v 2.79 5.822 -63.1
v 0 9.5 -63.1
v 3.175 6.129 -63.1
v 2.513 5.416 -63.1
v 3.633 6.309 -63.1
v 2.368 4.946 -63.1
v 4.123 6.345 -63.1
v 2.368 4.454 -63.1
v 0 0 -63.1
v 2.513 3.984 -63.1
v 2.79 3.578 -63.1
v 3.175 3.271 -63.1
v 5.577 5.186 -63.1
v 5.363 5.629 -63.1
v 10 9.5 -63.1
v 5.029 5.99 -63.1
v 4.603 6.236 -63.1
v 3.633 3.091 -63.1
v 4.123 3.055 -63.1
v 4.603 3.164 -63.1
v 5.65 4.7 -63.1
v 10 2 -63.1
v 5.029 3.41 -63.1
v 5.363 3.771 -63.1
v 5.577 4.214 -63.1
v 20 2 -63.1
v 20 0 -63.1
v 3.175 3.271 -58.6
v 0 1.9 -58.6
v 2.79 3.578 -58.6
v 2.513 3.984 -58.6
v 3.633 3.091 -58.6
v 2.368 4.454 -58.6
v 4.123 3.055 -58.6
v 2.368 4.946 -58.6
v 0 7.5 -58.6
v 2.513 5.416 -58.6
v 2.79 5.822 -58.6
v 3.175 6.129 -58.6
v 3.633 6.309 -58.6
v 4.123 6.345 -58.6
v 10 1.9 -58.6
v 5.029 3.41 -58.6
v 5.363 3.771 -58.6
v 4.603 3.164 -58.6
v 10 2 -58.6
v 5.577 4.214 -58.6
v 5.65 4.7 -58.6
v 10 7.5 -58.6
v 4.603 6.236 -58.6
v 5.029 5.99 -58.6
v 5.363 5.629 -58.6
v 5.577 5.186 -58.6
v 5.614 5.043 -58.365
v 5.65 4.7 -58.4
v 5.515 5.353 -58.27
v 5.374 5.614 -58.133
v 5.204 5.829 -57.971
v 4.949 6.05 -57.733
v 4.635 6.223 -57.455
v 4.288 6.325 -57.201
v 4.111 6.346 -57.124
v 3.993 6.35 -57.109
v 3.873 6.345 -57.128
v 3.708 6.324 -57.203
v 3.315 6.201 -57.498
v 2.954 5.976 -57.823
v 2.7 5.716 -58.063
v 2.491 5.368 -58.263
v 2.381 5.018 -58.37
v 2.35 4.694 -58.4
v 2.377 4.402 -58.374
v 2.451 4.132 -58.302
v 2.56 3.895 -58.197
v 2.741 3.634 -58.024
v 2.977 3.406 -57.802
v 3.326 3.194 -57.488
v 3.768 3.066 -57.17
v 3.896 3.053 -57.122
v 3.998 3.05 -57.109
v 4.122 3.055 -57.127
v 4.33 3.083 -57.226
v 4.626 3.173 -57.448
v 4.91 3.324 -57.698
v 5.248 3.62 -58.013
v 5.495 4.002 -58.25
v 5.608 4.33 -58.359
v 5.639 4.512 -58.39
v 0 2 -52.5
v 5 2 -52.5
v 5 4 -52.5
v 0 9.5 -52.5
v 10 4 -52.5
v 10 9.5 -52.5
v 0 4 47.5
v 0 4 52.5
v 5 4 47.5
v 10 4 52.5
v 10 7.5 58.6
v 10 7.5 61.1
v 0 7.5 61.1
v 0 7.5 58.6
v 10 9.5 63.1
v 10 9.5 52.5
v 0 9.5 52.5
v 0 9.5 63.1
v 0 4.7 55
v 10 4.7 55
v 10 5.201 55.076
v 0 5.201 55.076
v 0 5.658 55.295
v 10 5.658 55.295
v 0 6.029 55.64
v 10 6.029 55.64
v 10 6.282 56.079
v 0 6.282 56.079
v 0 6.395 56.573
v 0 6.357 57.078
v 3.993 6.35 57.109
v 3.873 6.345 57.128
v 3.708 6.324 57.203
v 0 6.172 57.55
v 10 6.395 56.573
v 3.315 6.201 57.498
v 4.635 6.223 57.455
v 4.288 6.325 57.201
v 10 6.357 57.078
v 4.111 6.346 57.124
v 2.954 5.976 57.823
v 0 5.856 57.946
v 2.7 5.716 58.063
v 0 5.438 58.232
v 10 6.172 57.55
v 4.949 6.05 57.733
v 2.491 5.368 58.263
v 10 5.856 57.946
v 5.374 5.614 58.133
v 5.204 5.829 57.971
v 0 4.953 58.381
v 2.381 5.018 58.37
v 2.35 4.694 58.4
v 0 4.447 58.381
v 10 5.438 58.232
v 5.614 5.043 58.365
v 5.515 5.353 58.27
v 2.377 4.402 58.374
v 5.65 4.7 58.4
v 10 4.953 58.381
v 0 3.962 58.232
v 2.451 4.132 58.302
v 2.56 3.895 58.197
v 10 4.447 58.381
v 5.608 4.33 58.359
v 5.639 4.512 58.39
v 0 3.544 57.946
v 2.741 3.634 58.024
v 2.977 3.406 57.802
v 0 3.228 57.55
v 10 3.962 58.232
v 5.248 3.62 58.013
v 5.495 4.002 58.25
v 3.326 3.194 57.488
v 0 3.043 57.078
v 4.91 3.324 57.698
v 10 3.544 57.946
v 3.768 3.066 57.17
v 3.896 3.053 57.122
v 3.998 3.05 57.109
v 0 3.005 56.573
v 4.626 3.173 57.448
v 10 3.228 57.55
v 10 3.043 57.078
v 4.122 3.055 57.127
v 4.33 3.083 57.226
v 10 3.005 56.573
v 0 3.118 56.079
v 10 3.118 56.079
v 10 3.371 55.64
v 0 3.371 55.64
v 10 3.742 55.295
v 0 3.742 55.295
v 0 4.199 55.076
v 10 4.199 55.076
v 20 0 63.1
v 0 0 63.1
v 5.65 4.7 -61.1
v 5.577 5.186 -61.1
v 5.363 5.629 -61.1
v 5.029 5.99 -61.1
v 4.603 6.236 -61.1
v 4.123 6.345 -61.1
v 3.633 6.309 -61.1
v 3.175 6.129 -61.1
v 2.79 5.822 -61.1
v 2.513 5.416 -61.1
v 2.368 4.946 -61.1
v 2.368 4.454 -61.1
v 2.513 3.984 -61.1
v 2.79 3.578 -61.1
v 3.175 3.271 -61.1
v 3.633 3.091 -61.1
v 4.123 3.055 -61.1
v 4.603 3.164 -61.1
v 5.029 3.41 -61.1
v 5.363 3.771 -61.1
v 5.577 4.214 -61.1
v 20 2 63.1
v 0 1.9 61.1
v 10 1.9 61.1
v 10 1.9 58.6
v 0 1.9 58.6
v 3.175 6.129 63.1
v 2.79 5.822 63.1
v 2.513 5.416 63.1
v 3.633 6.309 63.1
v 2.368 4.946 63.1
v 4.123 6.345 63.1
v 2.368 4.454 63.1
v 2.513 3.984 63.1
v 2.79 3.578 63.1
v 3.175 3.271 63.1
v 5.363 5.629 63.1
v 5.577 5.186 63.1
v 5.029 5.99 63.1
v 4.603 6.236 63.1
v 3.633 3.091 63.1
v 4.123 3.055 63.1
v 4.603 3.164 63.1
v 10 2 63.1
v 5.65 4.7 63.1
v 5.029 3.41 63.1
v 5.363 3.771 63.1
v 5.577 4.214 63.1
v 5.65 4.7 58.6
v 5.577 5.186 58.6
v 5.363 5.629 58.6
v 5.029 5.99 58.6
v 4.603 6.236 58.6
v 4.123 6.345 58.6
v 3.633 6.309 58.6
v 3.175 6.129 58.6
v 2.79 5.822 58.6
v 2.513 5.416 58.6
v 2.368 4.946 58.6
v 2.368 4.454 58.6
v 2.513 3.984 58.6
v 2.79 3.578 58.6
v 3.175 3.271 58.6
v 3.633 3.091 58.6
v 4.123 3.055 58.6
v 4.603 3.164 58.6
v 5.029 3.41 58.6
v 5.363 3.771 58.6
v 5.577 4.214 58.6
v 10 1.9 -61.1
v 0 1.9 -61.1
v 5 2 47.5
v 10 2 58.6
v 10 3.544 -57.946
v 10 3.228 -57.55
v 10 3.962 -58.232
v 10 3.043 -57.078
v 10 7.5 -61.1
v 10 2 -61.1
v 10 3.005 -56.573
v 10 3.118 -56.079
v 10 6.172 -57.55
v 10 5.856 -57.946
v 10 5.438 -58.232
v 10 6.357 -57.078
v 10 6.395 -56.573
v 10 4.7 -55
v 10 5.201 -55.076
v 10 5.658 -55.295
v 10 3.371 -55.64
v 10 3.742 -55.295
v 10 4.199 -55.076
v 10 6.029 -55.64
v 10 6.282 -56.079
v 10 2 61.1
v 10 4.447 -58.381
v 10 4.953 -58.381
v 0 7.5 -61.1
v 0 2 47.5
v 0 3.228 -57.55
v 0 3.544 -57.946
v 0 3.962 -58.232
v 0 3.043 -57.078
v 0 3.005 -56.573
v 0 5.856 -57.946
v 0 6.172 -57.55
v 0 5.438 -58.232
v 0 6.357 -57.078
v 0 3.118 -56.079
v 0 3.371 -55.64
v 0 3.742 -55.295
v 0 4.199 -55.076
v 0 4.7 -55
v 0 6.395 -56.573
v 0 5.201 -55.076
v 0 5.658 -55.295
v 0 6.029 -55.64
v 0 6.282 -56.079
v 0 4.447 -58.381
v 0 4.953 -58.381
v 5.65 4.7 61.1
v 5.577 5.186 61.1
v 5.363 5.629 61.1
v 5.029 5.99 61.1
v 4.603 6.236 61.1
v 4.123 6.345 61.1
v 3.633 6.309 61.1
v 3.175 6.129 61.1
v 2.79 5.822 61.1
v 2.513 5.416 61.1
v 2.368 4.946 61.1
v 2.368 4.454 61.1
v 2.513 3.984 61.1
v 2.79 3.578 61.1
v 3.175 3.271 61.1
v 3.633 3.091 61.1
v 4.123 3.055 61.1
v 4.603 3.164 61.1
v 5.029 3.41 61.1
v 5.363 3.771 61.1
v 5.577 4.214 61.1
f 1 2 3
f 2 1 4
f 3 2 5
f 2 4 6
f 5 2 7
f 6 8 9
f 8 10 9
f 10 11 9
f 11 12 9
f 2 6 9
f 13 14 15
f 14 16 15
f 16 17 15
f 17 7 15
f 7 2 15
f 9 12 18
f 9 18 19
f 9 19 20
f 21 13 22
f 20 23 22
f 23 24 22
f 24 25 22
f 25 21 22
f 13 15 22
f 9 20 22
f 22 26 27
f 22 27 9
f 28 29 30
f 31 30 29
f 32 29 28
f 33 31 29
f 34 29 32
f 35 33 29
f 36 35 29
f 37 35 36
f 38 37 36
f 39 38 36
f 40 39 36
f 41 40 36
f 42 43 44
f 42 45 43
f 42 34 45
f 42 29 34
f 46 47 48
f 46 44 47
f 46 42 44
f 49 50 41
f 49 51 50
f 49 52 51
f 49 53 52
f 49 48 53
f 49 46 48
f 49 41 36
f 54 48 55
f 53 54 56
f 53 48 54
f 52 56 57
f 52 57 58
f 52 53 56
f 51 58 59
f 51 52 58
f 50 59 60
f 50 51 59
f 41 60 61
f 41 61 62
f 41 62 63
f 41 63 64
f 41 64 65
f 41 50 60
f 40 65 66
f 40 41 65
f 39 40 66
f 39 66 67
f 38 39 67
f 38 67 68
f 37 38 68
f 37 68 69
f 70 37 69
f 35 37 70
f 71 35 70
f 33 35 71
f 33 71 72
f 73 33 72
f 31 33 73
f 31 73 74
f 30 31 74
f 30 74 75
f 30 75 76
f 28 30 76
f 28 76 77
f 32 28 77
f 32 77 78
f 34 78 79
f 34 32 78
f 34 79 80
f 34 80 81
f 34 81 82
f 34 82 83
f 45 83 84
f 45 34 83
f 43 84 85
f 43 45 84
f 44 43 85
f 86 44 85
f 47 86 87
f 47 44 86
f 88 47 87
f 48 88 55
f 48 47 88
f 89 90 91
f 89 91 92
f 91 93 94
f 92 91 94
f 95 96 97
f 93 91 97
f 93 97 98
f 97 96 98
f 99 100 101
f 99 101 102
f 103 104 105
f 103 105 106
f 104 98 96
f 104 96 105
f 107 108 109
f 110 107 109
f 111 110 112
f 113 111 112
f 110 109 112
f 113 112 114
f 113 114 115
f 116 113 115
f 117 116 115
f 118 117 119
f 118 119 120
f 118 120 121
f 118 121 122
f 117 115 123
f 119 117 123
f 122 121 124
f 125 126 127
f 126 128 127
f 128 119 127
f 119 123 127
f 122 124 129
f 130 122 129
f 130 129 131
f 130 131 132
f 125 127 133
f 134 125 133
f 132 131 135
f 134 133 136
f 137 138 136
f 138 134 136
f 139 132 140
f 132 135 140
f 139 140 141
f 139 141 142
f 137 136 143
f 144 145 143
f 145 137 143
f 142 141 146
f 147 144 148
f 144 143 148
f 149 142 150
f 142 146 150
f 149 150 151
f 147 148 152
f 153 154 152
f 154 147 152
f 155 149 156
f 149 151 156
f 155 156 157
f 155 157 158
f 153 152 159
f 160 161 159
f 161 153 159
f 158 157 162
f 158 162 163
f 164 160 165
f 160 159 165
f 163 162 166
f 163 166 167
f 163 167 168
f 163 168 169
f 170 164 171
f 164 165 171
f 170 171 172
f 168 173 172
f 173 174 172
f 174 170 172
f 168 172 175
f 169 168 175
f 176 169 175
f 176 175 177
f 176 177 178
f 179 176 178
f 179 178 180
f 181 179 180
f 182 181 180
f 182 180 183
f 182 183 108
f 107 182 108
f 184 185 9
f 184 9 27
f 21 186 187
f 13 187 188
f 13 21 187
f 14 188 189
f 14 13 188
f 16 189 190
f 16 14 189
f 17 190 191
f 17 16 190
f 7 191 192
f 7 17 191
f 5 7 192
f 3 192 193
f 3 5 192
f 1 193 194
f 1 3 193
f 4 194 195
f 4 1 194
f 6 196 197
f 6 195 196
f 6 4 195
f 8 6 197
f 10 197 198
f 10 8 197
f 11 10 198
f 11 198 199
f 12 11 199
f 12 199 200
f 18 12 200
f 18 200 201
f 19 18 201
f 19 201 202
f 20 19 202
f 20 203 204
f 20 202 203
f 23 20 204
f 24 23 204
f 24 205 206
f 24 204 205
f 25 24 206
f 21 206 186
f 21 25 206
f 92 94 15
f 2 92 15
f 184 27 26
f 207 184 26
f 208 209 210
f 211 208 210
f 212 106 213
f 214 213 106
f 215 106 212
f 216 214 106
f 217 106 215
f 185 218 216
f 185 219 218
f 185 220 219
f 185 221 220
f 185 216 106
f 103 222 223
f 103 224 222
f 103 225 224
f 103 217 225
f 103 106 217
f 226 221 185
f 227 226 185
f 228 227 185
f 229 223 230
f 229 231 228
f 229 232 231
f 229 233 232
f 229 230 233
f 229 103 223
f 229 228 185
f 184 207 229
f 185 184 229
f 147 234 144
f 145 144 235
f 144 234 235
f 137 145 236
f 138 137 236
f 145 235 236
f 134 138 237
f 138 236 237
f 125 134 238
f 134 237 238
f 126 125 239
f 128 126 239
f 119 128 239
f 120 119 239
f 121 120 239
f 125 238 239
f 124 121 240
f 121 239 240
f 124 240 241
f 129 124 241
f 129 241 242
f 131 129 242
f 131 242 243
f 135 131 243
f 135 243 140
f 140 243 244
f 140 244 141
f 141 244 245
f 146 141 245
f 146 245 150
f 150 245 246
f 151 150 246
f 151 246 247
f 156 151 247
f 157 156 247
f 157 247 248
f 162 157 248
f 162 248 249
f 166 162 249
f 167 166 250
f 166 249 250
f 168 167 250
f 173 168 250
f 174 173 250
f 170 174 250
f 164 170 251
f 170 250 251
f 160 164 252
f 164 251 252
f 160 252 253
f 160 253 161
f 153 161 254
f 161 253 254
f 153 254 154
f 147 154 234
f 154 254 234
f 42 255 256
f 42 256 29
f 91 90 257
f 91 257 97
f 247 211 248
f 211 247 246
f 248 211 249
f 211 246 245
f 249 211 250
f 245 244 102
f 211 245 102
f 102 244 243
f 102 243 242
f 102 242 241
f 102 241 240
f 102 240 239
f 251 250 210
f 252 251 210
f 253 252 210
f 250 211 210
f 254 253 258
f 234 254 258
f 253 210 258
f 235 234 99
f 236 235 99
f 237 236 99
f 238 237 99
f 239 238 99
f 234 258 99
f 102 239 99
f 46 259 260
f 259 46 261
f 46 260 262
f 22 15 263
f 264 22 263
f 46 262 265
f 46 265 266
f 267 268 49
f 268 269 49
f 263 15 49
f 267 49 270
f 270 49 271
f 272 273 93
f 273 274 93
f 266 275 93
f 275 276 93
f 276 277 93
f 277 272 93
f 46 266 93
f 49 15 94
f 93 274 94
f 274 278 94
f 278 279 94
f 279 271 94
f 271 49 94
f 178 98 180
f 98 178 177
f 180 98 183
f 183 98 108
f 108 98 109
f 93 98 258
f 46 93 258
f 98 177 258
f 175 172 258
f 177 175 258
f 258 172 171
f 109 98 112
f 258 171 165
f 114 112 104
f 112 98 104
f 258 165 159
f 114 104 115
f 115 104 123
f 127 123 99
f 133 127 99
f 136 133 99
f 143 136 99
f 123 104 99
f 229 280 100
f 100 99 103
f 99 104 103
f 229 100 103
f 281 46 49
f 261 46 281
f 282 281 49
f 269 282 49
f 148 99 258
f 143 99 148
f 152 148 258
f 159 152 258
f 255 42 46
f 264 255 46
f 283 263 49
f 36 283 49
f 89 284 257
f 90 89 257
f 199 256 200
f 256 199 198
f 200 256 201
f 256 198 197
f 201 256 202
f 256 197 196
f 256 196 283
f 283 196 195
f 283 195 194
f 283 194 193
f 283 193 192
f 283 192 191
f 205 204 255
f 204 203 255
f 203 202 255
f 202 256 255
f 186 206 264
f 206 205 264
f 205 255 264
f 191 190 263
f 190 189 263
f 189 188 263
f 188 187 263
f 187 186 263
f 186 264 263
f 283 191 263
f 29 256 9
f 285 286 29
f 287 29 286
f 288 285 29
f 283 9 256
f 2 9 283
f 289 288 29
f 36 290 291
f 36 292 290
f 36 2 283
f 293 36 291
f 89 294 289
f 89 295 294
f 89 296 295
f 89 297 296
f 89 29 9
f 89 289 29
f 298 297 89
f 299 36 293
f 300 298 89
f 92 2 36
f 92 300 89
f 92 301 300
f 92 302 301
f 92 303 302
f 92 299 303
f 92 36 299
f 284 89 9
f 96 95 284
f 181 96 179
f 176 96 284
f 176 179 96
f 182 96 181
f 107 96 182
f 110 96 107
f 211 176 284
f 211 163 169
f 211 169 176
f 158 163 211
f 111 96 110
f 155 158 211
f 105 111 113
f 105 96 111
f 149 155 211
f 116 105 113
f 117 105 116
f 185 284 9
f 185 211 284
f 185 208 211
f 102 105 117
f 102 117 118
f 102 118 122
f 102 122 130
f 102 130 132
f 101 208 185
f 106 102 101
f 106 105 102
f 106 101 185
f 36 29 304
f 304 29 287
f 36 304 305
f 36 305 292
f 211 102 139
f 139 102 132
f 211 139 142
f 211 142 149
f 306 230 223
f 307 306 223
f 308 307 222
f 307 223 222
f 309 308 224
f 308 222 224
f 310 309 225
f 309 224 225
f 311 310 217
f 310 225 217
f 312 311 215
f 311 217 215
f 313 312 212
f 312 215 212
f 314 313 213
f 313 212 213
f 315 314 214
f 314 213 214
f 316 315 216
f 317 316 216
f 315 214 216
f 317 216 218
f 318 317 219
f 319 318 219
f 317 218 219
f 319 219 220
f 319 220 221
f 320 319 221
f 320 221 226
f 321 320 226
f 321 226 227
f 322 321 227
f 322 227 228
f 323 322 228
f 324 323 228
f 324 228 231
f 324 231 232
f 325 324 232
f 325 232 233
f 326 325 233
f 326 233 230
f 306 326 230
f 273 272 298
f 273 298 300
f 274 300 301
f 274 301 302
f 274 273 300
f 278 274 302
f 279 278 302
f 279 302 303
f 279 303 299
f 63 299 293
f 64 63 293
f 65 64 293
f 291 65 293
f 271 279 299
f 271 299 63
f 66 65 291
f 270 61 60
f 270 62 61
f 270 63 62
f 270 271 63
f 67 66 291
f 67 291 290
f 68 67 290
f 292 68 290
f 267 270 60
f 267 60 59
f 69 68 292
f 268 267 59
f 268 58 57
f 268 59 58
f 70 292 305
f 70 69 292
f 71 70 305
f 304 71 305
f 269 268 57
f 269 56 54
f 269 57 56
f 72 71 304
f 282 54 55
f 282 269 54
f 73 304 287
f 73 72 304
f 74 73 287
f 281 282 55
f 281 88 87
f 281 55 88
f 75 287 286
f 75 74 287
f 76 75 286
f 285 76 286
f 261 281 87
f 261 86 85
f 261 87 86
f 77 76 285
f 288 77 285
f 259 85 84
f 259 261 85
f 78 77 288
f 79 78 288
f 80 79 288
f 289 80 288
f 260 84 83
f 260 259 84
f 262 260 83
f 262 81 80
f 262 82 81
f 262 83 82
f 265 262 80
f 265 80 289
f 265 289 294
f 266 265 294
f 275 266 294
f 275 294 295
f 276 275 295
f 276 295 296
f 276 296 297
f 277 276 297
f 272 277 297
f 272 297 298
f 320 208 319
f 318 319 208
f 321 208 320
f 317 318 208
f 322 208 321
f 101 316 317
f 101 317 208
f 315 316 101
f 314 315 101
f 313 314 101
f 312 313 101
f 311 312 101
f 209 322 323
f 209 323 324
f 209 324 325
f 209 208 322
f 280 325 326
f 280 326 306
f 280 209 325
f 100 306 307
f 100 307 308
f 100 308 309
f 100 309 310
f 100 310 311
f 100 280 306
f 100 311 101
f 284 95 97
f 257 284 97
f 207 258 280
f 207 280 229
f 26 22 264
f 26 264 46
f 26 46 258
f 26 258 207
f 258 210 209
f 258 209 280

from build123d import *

# Parameters (mm, degrees)
RESSALTO_EXTRUS_O1_DEPTH             = 52.5
ESBO_O3_W                            = 10
ESBO_O3_H                            = 4
RESSALTO_EXTRUS_O2_DEPTH             = 5
ESBO_O4_R                            = 1.7
ESBO_O4_W                            = 2.5
ESBO_O4_H                            = 5.6
RESSALTO_EXTRUS_O3_DEPTH             = 10
ESBO_O5_R                            = 1.65
CORTE_EXTRUS_O1_DEPTH                = 6
RESSALTO_EXTRUS_O4_REACH             = 12.6
ESBO_O6_W                            = 10
ESBO_O6_H                            = 2
RESSALTO_EXTRUS_O4_DIRECTION_2_REACH = 117.6


with BuildPart() as part:
    # Esboço1 → Ressalto-extrusão1 (new body, symmetric)
    with BuildSketch(Plane.XY):
        Polygon((0, 0), (0, 2), (5, 2), (5, 4), (10, 4), (10, 2), (20, 2), (20, 0), align=None)
    extrude(amount=RESSALTO_EXTRUS_O1_DEPTH, both=True)

    # Esboço3 → Ressalto-extrusão2 (add)
    with BuildSketch(Plane.XY.offset(52.5)):
        with Locations((5, 2)):
            Rectangle(ESBO_O3_W, ESBO_O3_H)
    extrude(amount=-RESSALTO_EXTRUS_O2_DEPTH)

    # Esboço4 → Ressalto-extrusão3 (add, through all)
    with BuildSketch(Plane(origin=(10, 0, 0), x_dir=(0, 0, -1), z_dir=(1, 0, 0))):
        Polygon((-52.5, 9.5), (-63.1, 9.5), (-63.1, 0), (-52.5, 0), (-52.5, 3.742943079), align=None)
        with Locations((-56.7, 4.7)):
            Circle(ESBO_O4_R, mode=Mode.SUBTRACT)
        with Locations((-59.85, 4.7)):
            Rectangle(ESBO_O4_W, ESBO_O4_H, mode=Mode.SUBTRACT)
    ressalto_extrus_o3 = extrude(amount=-RESSALTO_EXTRUS_O3_DEPTH)

    # Esboço5 → Corte-extrusão1 (cut)
    with BuildSketch(Plane.XY.offset(63.1)):
        with Locations((4, 4.7)):
            Circle(ESBO_O5_R)
    corte_extrus_o1 = extrude(amount=-CORTE_EXTRUS_O1_DEPTH, mode=Mode.SUBTRACT)

    # Espelhar1: Ressalto-extrusão3, Corte-extrusão1 across plane
    add(ressalto_extrus_o3.mirror(Plane.XY))
    add(corte_extrus_o1.mirror(Plane.XY), mode=Mode.SUBTRACT)

    # Ressalto-extrusão4: up to this face of the body (flat: up to its plane)
    ressalto_extrus_o4_end = Plane(part.part.faces().sort_by_distance((5, 9.362068858, 63.1))[0])
    # Esboço6 → Ressalto-extrusão4 (add, up to the picked face)
    with BuildSketch(Plane.XY.offset(52.5), mode=Mode.PRIVATE) as ressalto_extrus_o4_sk1:
        with Locations((15, 1)):
            Rectangle(ESBO_O6_W, ESBO_O6_H)
    ressalto_extrus_o4_tool1 = split(extrude(ressalto_extrus_o4_sk1.sketch, amount=RESSALTO_EXTRUS_O4_REACH, mode=Mode.PRIVATE), bisect_by=ressalto_extrus_o4_end, keep=Keep.BOTH, mode=Mode.PRIVATE)
    add(ressalto_extrus_o4_tool1.solids().sort_by_distance((15, 1, 52.5))[0])

    # Ressalto-extrusão4 direction 2: up to this face of the body (flat: up to its plane)
    ressalto_extrus_o4_direction_2_end = Plane(part.part.faces().sort_by_distance((5, 9.362068858, -63.1))[0])
    # Esboço6 → Ressalto-extrusão4 direction 2 (add, up to the picked face)
    with BuildSketch(Plane.XY.offset(52.5), mode=Mode.PRIVATE) as ressalto_extrus_o4_direction_2_sk1:
        with Locations((15, 1)):
            Rectangle(ESBO_O6_W, ESBO_O6_H)
    ressalto_extrus_o4_direction_2_tool1 = split(extrude(ressalto_extrus_o4_direction_2_sk1.sketch, amount=-RESSALTO_EXTRUS_O4_DIRECTION_2_REACH, mode=Mode.PRIVATE), bisect_by=ressalto_extrus_o4_direction_2_end, keep=Keep.BOTH, mode=Mode.PRIVATE)
    add(ressalto_extrus_o4_direction_2_tool1.solids().sort_by_distance((15, 1, 52.5))[0])


solid = part.part
